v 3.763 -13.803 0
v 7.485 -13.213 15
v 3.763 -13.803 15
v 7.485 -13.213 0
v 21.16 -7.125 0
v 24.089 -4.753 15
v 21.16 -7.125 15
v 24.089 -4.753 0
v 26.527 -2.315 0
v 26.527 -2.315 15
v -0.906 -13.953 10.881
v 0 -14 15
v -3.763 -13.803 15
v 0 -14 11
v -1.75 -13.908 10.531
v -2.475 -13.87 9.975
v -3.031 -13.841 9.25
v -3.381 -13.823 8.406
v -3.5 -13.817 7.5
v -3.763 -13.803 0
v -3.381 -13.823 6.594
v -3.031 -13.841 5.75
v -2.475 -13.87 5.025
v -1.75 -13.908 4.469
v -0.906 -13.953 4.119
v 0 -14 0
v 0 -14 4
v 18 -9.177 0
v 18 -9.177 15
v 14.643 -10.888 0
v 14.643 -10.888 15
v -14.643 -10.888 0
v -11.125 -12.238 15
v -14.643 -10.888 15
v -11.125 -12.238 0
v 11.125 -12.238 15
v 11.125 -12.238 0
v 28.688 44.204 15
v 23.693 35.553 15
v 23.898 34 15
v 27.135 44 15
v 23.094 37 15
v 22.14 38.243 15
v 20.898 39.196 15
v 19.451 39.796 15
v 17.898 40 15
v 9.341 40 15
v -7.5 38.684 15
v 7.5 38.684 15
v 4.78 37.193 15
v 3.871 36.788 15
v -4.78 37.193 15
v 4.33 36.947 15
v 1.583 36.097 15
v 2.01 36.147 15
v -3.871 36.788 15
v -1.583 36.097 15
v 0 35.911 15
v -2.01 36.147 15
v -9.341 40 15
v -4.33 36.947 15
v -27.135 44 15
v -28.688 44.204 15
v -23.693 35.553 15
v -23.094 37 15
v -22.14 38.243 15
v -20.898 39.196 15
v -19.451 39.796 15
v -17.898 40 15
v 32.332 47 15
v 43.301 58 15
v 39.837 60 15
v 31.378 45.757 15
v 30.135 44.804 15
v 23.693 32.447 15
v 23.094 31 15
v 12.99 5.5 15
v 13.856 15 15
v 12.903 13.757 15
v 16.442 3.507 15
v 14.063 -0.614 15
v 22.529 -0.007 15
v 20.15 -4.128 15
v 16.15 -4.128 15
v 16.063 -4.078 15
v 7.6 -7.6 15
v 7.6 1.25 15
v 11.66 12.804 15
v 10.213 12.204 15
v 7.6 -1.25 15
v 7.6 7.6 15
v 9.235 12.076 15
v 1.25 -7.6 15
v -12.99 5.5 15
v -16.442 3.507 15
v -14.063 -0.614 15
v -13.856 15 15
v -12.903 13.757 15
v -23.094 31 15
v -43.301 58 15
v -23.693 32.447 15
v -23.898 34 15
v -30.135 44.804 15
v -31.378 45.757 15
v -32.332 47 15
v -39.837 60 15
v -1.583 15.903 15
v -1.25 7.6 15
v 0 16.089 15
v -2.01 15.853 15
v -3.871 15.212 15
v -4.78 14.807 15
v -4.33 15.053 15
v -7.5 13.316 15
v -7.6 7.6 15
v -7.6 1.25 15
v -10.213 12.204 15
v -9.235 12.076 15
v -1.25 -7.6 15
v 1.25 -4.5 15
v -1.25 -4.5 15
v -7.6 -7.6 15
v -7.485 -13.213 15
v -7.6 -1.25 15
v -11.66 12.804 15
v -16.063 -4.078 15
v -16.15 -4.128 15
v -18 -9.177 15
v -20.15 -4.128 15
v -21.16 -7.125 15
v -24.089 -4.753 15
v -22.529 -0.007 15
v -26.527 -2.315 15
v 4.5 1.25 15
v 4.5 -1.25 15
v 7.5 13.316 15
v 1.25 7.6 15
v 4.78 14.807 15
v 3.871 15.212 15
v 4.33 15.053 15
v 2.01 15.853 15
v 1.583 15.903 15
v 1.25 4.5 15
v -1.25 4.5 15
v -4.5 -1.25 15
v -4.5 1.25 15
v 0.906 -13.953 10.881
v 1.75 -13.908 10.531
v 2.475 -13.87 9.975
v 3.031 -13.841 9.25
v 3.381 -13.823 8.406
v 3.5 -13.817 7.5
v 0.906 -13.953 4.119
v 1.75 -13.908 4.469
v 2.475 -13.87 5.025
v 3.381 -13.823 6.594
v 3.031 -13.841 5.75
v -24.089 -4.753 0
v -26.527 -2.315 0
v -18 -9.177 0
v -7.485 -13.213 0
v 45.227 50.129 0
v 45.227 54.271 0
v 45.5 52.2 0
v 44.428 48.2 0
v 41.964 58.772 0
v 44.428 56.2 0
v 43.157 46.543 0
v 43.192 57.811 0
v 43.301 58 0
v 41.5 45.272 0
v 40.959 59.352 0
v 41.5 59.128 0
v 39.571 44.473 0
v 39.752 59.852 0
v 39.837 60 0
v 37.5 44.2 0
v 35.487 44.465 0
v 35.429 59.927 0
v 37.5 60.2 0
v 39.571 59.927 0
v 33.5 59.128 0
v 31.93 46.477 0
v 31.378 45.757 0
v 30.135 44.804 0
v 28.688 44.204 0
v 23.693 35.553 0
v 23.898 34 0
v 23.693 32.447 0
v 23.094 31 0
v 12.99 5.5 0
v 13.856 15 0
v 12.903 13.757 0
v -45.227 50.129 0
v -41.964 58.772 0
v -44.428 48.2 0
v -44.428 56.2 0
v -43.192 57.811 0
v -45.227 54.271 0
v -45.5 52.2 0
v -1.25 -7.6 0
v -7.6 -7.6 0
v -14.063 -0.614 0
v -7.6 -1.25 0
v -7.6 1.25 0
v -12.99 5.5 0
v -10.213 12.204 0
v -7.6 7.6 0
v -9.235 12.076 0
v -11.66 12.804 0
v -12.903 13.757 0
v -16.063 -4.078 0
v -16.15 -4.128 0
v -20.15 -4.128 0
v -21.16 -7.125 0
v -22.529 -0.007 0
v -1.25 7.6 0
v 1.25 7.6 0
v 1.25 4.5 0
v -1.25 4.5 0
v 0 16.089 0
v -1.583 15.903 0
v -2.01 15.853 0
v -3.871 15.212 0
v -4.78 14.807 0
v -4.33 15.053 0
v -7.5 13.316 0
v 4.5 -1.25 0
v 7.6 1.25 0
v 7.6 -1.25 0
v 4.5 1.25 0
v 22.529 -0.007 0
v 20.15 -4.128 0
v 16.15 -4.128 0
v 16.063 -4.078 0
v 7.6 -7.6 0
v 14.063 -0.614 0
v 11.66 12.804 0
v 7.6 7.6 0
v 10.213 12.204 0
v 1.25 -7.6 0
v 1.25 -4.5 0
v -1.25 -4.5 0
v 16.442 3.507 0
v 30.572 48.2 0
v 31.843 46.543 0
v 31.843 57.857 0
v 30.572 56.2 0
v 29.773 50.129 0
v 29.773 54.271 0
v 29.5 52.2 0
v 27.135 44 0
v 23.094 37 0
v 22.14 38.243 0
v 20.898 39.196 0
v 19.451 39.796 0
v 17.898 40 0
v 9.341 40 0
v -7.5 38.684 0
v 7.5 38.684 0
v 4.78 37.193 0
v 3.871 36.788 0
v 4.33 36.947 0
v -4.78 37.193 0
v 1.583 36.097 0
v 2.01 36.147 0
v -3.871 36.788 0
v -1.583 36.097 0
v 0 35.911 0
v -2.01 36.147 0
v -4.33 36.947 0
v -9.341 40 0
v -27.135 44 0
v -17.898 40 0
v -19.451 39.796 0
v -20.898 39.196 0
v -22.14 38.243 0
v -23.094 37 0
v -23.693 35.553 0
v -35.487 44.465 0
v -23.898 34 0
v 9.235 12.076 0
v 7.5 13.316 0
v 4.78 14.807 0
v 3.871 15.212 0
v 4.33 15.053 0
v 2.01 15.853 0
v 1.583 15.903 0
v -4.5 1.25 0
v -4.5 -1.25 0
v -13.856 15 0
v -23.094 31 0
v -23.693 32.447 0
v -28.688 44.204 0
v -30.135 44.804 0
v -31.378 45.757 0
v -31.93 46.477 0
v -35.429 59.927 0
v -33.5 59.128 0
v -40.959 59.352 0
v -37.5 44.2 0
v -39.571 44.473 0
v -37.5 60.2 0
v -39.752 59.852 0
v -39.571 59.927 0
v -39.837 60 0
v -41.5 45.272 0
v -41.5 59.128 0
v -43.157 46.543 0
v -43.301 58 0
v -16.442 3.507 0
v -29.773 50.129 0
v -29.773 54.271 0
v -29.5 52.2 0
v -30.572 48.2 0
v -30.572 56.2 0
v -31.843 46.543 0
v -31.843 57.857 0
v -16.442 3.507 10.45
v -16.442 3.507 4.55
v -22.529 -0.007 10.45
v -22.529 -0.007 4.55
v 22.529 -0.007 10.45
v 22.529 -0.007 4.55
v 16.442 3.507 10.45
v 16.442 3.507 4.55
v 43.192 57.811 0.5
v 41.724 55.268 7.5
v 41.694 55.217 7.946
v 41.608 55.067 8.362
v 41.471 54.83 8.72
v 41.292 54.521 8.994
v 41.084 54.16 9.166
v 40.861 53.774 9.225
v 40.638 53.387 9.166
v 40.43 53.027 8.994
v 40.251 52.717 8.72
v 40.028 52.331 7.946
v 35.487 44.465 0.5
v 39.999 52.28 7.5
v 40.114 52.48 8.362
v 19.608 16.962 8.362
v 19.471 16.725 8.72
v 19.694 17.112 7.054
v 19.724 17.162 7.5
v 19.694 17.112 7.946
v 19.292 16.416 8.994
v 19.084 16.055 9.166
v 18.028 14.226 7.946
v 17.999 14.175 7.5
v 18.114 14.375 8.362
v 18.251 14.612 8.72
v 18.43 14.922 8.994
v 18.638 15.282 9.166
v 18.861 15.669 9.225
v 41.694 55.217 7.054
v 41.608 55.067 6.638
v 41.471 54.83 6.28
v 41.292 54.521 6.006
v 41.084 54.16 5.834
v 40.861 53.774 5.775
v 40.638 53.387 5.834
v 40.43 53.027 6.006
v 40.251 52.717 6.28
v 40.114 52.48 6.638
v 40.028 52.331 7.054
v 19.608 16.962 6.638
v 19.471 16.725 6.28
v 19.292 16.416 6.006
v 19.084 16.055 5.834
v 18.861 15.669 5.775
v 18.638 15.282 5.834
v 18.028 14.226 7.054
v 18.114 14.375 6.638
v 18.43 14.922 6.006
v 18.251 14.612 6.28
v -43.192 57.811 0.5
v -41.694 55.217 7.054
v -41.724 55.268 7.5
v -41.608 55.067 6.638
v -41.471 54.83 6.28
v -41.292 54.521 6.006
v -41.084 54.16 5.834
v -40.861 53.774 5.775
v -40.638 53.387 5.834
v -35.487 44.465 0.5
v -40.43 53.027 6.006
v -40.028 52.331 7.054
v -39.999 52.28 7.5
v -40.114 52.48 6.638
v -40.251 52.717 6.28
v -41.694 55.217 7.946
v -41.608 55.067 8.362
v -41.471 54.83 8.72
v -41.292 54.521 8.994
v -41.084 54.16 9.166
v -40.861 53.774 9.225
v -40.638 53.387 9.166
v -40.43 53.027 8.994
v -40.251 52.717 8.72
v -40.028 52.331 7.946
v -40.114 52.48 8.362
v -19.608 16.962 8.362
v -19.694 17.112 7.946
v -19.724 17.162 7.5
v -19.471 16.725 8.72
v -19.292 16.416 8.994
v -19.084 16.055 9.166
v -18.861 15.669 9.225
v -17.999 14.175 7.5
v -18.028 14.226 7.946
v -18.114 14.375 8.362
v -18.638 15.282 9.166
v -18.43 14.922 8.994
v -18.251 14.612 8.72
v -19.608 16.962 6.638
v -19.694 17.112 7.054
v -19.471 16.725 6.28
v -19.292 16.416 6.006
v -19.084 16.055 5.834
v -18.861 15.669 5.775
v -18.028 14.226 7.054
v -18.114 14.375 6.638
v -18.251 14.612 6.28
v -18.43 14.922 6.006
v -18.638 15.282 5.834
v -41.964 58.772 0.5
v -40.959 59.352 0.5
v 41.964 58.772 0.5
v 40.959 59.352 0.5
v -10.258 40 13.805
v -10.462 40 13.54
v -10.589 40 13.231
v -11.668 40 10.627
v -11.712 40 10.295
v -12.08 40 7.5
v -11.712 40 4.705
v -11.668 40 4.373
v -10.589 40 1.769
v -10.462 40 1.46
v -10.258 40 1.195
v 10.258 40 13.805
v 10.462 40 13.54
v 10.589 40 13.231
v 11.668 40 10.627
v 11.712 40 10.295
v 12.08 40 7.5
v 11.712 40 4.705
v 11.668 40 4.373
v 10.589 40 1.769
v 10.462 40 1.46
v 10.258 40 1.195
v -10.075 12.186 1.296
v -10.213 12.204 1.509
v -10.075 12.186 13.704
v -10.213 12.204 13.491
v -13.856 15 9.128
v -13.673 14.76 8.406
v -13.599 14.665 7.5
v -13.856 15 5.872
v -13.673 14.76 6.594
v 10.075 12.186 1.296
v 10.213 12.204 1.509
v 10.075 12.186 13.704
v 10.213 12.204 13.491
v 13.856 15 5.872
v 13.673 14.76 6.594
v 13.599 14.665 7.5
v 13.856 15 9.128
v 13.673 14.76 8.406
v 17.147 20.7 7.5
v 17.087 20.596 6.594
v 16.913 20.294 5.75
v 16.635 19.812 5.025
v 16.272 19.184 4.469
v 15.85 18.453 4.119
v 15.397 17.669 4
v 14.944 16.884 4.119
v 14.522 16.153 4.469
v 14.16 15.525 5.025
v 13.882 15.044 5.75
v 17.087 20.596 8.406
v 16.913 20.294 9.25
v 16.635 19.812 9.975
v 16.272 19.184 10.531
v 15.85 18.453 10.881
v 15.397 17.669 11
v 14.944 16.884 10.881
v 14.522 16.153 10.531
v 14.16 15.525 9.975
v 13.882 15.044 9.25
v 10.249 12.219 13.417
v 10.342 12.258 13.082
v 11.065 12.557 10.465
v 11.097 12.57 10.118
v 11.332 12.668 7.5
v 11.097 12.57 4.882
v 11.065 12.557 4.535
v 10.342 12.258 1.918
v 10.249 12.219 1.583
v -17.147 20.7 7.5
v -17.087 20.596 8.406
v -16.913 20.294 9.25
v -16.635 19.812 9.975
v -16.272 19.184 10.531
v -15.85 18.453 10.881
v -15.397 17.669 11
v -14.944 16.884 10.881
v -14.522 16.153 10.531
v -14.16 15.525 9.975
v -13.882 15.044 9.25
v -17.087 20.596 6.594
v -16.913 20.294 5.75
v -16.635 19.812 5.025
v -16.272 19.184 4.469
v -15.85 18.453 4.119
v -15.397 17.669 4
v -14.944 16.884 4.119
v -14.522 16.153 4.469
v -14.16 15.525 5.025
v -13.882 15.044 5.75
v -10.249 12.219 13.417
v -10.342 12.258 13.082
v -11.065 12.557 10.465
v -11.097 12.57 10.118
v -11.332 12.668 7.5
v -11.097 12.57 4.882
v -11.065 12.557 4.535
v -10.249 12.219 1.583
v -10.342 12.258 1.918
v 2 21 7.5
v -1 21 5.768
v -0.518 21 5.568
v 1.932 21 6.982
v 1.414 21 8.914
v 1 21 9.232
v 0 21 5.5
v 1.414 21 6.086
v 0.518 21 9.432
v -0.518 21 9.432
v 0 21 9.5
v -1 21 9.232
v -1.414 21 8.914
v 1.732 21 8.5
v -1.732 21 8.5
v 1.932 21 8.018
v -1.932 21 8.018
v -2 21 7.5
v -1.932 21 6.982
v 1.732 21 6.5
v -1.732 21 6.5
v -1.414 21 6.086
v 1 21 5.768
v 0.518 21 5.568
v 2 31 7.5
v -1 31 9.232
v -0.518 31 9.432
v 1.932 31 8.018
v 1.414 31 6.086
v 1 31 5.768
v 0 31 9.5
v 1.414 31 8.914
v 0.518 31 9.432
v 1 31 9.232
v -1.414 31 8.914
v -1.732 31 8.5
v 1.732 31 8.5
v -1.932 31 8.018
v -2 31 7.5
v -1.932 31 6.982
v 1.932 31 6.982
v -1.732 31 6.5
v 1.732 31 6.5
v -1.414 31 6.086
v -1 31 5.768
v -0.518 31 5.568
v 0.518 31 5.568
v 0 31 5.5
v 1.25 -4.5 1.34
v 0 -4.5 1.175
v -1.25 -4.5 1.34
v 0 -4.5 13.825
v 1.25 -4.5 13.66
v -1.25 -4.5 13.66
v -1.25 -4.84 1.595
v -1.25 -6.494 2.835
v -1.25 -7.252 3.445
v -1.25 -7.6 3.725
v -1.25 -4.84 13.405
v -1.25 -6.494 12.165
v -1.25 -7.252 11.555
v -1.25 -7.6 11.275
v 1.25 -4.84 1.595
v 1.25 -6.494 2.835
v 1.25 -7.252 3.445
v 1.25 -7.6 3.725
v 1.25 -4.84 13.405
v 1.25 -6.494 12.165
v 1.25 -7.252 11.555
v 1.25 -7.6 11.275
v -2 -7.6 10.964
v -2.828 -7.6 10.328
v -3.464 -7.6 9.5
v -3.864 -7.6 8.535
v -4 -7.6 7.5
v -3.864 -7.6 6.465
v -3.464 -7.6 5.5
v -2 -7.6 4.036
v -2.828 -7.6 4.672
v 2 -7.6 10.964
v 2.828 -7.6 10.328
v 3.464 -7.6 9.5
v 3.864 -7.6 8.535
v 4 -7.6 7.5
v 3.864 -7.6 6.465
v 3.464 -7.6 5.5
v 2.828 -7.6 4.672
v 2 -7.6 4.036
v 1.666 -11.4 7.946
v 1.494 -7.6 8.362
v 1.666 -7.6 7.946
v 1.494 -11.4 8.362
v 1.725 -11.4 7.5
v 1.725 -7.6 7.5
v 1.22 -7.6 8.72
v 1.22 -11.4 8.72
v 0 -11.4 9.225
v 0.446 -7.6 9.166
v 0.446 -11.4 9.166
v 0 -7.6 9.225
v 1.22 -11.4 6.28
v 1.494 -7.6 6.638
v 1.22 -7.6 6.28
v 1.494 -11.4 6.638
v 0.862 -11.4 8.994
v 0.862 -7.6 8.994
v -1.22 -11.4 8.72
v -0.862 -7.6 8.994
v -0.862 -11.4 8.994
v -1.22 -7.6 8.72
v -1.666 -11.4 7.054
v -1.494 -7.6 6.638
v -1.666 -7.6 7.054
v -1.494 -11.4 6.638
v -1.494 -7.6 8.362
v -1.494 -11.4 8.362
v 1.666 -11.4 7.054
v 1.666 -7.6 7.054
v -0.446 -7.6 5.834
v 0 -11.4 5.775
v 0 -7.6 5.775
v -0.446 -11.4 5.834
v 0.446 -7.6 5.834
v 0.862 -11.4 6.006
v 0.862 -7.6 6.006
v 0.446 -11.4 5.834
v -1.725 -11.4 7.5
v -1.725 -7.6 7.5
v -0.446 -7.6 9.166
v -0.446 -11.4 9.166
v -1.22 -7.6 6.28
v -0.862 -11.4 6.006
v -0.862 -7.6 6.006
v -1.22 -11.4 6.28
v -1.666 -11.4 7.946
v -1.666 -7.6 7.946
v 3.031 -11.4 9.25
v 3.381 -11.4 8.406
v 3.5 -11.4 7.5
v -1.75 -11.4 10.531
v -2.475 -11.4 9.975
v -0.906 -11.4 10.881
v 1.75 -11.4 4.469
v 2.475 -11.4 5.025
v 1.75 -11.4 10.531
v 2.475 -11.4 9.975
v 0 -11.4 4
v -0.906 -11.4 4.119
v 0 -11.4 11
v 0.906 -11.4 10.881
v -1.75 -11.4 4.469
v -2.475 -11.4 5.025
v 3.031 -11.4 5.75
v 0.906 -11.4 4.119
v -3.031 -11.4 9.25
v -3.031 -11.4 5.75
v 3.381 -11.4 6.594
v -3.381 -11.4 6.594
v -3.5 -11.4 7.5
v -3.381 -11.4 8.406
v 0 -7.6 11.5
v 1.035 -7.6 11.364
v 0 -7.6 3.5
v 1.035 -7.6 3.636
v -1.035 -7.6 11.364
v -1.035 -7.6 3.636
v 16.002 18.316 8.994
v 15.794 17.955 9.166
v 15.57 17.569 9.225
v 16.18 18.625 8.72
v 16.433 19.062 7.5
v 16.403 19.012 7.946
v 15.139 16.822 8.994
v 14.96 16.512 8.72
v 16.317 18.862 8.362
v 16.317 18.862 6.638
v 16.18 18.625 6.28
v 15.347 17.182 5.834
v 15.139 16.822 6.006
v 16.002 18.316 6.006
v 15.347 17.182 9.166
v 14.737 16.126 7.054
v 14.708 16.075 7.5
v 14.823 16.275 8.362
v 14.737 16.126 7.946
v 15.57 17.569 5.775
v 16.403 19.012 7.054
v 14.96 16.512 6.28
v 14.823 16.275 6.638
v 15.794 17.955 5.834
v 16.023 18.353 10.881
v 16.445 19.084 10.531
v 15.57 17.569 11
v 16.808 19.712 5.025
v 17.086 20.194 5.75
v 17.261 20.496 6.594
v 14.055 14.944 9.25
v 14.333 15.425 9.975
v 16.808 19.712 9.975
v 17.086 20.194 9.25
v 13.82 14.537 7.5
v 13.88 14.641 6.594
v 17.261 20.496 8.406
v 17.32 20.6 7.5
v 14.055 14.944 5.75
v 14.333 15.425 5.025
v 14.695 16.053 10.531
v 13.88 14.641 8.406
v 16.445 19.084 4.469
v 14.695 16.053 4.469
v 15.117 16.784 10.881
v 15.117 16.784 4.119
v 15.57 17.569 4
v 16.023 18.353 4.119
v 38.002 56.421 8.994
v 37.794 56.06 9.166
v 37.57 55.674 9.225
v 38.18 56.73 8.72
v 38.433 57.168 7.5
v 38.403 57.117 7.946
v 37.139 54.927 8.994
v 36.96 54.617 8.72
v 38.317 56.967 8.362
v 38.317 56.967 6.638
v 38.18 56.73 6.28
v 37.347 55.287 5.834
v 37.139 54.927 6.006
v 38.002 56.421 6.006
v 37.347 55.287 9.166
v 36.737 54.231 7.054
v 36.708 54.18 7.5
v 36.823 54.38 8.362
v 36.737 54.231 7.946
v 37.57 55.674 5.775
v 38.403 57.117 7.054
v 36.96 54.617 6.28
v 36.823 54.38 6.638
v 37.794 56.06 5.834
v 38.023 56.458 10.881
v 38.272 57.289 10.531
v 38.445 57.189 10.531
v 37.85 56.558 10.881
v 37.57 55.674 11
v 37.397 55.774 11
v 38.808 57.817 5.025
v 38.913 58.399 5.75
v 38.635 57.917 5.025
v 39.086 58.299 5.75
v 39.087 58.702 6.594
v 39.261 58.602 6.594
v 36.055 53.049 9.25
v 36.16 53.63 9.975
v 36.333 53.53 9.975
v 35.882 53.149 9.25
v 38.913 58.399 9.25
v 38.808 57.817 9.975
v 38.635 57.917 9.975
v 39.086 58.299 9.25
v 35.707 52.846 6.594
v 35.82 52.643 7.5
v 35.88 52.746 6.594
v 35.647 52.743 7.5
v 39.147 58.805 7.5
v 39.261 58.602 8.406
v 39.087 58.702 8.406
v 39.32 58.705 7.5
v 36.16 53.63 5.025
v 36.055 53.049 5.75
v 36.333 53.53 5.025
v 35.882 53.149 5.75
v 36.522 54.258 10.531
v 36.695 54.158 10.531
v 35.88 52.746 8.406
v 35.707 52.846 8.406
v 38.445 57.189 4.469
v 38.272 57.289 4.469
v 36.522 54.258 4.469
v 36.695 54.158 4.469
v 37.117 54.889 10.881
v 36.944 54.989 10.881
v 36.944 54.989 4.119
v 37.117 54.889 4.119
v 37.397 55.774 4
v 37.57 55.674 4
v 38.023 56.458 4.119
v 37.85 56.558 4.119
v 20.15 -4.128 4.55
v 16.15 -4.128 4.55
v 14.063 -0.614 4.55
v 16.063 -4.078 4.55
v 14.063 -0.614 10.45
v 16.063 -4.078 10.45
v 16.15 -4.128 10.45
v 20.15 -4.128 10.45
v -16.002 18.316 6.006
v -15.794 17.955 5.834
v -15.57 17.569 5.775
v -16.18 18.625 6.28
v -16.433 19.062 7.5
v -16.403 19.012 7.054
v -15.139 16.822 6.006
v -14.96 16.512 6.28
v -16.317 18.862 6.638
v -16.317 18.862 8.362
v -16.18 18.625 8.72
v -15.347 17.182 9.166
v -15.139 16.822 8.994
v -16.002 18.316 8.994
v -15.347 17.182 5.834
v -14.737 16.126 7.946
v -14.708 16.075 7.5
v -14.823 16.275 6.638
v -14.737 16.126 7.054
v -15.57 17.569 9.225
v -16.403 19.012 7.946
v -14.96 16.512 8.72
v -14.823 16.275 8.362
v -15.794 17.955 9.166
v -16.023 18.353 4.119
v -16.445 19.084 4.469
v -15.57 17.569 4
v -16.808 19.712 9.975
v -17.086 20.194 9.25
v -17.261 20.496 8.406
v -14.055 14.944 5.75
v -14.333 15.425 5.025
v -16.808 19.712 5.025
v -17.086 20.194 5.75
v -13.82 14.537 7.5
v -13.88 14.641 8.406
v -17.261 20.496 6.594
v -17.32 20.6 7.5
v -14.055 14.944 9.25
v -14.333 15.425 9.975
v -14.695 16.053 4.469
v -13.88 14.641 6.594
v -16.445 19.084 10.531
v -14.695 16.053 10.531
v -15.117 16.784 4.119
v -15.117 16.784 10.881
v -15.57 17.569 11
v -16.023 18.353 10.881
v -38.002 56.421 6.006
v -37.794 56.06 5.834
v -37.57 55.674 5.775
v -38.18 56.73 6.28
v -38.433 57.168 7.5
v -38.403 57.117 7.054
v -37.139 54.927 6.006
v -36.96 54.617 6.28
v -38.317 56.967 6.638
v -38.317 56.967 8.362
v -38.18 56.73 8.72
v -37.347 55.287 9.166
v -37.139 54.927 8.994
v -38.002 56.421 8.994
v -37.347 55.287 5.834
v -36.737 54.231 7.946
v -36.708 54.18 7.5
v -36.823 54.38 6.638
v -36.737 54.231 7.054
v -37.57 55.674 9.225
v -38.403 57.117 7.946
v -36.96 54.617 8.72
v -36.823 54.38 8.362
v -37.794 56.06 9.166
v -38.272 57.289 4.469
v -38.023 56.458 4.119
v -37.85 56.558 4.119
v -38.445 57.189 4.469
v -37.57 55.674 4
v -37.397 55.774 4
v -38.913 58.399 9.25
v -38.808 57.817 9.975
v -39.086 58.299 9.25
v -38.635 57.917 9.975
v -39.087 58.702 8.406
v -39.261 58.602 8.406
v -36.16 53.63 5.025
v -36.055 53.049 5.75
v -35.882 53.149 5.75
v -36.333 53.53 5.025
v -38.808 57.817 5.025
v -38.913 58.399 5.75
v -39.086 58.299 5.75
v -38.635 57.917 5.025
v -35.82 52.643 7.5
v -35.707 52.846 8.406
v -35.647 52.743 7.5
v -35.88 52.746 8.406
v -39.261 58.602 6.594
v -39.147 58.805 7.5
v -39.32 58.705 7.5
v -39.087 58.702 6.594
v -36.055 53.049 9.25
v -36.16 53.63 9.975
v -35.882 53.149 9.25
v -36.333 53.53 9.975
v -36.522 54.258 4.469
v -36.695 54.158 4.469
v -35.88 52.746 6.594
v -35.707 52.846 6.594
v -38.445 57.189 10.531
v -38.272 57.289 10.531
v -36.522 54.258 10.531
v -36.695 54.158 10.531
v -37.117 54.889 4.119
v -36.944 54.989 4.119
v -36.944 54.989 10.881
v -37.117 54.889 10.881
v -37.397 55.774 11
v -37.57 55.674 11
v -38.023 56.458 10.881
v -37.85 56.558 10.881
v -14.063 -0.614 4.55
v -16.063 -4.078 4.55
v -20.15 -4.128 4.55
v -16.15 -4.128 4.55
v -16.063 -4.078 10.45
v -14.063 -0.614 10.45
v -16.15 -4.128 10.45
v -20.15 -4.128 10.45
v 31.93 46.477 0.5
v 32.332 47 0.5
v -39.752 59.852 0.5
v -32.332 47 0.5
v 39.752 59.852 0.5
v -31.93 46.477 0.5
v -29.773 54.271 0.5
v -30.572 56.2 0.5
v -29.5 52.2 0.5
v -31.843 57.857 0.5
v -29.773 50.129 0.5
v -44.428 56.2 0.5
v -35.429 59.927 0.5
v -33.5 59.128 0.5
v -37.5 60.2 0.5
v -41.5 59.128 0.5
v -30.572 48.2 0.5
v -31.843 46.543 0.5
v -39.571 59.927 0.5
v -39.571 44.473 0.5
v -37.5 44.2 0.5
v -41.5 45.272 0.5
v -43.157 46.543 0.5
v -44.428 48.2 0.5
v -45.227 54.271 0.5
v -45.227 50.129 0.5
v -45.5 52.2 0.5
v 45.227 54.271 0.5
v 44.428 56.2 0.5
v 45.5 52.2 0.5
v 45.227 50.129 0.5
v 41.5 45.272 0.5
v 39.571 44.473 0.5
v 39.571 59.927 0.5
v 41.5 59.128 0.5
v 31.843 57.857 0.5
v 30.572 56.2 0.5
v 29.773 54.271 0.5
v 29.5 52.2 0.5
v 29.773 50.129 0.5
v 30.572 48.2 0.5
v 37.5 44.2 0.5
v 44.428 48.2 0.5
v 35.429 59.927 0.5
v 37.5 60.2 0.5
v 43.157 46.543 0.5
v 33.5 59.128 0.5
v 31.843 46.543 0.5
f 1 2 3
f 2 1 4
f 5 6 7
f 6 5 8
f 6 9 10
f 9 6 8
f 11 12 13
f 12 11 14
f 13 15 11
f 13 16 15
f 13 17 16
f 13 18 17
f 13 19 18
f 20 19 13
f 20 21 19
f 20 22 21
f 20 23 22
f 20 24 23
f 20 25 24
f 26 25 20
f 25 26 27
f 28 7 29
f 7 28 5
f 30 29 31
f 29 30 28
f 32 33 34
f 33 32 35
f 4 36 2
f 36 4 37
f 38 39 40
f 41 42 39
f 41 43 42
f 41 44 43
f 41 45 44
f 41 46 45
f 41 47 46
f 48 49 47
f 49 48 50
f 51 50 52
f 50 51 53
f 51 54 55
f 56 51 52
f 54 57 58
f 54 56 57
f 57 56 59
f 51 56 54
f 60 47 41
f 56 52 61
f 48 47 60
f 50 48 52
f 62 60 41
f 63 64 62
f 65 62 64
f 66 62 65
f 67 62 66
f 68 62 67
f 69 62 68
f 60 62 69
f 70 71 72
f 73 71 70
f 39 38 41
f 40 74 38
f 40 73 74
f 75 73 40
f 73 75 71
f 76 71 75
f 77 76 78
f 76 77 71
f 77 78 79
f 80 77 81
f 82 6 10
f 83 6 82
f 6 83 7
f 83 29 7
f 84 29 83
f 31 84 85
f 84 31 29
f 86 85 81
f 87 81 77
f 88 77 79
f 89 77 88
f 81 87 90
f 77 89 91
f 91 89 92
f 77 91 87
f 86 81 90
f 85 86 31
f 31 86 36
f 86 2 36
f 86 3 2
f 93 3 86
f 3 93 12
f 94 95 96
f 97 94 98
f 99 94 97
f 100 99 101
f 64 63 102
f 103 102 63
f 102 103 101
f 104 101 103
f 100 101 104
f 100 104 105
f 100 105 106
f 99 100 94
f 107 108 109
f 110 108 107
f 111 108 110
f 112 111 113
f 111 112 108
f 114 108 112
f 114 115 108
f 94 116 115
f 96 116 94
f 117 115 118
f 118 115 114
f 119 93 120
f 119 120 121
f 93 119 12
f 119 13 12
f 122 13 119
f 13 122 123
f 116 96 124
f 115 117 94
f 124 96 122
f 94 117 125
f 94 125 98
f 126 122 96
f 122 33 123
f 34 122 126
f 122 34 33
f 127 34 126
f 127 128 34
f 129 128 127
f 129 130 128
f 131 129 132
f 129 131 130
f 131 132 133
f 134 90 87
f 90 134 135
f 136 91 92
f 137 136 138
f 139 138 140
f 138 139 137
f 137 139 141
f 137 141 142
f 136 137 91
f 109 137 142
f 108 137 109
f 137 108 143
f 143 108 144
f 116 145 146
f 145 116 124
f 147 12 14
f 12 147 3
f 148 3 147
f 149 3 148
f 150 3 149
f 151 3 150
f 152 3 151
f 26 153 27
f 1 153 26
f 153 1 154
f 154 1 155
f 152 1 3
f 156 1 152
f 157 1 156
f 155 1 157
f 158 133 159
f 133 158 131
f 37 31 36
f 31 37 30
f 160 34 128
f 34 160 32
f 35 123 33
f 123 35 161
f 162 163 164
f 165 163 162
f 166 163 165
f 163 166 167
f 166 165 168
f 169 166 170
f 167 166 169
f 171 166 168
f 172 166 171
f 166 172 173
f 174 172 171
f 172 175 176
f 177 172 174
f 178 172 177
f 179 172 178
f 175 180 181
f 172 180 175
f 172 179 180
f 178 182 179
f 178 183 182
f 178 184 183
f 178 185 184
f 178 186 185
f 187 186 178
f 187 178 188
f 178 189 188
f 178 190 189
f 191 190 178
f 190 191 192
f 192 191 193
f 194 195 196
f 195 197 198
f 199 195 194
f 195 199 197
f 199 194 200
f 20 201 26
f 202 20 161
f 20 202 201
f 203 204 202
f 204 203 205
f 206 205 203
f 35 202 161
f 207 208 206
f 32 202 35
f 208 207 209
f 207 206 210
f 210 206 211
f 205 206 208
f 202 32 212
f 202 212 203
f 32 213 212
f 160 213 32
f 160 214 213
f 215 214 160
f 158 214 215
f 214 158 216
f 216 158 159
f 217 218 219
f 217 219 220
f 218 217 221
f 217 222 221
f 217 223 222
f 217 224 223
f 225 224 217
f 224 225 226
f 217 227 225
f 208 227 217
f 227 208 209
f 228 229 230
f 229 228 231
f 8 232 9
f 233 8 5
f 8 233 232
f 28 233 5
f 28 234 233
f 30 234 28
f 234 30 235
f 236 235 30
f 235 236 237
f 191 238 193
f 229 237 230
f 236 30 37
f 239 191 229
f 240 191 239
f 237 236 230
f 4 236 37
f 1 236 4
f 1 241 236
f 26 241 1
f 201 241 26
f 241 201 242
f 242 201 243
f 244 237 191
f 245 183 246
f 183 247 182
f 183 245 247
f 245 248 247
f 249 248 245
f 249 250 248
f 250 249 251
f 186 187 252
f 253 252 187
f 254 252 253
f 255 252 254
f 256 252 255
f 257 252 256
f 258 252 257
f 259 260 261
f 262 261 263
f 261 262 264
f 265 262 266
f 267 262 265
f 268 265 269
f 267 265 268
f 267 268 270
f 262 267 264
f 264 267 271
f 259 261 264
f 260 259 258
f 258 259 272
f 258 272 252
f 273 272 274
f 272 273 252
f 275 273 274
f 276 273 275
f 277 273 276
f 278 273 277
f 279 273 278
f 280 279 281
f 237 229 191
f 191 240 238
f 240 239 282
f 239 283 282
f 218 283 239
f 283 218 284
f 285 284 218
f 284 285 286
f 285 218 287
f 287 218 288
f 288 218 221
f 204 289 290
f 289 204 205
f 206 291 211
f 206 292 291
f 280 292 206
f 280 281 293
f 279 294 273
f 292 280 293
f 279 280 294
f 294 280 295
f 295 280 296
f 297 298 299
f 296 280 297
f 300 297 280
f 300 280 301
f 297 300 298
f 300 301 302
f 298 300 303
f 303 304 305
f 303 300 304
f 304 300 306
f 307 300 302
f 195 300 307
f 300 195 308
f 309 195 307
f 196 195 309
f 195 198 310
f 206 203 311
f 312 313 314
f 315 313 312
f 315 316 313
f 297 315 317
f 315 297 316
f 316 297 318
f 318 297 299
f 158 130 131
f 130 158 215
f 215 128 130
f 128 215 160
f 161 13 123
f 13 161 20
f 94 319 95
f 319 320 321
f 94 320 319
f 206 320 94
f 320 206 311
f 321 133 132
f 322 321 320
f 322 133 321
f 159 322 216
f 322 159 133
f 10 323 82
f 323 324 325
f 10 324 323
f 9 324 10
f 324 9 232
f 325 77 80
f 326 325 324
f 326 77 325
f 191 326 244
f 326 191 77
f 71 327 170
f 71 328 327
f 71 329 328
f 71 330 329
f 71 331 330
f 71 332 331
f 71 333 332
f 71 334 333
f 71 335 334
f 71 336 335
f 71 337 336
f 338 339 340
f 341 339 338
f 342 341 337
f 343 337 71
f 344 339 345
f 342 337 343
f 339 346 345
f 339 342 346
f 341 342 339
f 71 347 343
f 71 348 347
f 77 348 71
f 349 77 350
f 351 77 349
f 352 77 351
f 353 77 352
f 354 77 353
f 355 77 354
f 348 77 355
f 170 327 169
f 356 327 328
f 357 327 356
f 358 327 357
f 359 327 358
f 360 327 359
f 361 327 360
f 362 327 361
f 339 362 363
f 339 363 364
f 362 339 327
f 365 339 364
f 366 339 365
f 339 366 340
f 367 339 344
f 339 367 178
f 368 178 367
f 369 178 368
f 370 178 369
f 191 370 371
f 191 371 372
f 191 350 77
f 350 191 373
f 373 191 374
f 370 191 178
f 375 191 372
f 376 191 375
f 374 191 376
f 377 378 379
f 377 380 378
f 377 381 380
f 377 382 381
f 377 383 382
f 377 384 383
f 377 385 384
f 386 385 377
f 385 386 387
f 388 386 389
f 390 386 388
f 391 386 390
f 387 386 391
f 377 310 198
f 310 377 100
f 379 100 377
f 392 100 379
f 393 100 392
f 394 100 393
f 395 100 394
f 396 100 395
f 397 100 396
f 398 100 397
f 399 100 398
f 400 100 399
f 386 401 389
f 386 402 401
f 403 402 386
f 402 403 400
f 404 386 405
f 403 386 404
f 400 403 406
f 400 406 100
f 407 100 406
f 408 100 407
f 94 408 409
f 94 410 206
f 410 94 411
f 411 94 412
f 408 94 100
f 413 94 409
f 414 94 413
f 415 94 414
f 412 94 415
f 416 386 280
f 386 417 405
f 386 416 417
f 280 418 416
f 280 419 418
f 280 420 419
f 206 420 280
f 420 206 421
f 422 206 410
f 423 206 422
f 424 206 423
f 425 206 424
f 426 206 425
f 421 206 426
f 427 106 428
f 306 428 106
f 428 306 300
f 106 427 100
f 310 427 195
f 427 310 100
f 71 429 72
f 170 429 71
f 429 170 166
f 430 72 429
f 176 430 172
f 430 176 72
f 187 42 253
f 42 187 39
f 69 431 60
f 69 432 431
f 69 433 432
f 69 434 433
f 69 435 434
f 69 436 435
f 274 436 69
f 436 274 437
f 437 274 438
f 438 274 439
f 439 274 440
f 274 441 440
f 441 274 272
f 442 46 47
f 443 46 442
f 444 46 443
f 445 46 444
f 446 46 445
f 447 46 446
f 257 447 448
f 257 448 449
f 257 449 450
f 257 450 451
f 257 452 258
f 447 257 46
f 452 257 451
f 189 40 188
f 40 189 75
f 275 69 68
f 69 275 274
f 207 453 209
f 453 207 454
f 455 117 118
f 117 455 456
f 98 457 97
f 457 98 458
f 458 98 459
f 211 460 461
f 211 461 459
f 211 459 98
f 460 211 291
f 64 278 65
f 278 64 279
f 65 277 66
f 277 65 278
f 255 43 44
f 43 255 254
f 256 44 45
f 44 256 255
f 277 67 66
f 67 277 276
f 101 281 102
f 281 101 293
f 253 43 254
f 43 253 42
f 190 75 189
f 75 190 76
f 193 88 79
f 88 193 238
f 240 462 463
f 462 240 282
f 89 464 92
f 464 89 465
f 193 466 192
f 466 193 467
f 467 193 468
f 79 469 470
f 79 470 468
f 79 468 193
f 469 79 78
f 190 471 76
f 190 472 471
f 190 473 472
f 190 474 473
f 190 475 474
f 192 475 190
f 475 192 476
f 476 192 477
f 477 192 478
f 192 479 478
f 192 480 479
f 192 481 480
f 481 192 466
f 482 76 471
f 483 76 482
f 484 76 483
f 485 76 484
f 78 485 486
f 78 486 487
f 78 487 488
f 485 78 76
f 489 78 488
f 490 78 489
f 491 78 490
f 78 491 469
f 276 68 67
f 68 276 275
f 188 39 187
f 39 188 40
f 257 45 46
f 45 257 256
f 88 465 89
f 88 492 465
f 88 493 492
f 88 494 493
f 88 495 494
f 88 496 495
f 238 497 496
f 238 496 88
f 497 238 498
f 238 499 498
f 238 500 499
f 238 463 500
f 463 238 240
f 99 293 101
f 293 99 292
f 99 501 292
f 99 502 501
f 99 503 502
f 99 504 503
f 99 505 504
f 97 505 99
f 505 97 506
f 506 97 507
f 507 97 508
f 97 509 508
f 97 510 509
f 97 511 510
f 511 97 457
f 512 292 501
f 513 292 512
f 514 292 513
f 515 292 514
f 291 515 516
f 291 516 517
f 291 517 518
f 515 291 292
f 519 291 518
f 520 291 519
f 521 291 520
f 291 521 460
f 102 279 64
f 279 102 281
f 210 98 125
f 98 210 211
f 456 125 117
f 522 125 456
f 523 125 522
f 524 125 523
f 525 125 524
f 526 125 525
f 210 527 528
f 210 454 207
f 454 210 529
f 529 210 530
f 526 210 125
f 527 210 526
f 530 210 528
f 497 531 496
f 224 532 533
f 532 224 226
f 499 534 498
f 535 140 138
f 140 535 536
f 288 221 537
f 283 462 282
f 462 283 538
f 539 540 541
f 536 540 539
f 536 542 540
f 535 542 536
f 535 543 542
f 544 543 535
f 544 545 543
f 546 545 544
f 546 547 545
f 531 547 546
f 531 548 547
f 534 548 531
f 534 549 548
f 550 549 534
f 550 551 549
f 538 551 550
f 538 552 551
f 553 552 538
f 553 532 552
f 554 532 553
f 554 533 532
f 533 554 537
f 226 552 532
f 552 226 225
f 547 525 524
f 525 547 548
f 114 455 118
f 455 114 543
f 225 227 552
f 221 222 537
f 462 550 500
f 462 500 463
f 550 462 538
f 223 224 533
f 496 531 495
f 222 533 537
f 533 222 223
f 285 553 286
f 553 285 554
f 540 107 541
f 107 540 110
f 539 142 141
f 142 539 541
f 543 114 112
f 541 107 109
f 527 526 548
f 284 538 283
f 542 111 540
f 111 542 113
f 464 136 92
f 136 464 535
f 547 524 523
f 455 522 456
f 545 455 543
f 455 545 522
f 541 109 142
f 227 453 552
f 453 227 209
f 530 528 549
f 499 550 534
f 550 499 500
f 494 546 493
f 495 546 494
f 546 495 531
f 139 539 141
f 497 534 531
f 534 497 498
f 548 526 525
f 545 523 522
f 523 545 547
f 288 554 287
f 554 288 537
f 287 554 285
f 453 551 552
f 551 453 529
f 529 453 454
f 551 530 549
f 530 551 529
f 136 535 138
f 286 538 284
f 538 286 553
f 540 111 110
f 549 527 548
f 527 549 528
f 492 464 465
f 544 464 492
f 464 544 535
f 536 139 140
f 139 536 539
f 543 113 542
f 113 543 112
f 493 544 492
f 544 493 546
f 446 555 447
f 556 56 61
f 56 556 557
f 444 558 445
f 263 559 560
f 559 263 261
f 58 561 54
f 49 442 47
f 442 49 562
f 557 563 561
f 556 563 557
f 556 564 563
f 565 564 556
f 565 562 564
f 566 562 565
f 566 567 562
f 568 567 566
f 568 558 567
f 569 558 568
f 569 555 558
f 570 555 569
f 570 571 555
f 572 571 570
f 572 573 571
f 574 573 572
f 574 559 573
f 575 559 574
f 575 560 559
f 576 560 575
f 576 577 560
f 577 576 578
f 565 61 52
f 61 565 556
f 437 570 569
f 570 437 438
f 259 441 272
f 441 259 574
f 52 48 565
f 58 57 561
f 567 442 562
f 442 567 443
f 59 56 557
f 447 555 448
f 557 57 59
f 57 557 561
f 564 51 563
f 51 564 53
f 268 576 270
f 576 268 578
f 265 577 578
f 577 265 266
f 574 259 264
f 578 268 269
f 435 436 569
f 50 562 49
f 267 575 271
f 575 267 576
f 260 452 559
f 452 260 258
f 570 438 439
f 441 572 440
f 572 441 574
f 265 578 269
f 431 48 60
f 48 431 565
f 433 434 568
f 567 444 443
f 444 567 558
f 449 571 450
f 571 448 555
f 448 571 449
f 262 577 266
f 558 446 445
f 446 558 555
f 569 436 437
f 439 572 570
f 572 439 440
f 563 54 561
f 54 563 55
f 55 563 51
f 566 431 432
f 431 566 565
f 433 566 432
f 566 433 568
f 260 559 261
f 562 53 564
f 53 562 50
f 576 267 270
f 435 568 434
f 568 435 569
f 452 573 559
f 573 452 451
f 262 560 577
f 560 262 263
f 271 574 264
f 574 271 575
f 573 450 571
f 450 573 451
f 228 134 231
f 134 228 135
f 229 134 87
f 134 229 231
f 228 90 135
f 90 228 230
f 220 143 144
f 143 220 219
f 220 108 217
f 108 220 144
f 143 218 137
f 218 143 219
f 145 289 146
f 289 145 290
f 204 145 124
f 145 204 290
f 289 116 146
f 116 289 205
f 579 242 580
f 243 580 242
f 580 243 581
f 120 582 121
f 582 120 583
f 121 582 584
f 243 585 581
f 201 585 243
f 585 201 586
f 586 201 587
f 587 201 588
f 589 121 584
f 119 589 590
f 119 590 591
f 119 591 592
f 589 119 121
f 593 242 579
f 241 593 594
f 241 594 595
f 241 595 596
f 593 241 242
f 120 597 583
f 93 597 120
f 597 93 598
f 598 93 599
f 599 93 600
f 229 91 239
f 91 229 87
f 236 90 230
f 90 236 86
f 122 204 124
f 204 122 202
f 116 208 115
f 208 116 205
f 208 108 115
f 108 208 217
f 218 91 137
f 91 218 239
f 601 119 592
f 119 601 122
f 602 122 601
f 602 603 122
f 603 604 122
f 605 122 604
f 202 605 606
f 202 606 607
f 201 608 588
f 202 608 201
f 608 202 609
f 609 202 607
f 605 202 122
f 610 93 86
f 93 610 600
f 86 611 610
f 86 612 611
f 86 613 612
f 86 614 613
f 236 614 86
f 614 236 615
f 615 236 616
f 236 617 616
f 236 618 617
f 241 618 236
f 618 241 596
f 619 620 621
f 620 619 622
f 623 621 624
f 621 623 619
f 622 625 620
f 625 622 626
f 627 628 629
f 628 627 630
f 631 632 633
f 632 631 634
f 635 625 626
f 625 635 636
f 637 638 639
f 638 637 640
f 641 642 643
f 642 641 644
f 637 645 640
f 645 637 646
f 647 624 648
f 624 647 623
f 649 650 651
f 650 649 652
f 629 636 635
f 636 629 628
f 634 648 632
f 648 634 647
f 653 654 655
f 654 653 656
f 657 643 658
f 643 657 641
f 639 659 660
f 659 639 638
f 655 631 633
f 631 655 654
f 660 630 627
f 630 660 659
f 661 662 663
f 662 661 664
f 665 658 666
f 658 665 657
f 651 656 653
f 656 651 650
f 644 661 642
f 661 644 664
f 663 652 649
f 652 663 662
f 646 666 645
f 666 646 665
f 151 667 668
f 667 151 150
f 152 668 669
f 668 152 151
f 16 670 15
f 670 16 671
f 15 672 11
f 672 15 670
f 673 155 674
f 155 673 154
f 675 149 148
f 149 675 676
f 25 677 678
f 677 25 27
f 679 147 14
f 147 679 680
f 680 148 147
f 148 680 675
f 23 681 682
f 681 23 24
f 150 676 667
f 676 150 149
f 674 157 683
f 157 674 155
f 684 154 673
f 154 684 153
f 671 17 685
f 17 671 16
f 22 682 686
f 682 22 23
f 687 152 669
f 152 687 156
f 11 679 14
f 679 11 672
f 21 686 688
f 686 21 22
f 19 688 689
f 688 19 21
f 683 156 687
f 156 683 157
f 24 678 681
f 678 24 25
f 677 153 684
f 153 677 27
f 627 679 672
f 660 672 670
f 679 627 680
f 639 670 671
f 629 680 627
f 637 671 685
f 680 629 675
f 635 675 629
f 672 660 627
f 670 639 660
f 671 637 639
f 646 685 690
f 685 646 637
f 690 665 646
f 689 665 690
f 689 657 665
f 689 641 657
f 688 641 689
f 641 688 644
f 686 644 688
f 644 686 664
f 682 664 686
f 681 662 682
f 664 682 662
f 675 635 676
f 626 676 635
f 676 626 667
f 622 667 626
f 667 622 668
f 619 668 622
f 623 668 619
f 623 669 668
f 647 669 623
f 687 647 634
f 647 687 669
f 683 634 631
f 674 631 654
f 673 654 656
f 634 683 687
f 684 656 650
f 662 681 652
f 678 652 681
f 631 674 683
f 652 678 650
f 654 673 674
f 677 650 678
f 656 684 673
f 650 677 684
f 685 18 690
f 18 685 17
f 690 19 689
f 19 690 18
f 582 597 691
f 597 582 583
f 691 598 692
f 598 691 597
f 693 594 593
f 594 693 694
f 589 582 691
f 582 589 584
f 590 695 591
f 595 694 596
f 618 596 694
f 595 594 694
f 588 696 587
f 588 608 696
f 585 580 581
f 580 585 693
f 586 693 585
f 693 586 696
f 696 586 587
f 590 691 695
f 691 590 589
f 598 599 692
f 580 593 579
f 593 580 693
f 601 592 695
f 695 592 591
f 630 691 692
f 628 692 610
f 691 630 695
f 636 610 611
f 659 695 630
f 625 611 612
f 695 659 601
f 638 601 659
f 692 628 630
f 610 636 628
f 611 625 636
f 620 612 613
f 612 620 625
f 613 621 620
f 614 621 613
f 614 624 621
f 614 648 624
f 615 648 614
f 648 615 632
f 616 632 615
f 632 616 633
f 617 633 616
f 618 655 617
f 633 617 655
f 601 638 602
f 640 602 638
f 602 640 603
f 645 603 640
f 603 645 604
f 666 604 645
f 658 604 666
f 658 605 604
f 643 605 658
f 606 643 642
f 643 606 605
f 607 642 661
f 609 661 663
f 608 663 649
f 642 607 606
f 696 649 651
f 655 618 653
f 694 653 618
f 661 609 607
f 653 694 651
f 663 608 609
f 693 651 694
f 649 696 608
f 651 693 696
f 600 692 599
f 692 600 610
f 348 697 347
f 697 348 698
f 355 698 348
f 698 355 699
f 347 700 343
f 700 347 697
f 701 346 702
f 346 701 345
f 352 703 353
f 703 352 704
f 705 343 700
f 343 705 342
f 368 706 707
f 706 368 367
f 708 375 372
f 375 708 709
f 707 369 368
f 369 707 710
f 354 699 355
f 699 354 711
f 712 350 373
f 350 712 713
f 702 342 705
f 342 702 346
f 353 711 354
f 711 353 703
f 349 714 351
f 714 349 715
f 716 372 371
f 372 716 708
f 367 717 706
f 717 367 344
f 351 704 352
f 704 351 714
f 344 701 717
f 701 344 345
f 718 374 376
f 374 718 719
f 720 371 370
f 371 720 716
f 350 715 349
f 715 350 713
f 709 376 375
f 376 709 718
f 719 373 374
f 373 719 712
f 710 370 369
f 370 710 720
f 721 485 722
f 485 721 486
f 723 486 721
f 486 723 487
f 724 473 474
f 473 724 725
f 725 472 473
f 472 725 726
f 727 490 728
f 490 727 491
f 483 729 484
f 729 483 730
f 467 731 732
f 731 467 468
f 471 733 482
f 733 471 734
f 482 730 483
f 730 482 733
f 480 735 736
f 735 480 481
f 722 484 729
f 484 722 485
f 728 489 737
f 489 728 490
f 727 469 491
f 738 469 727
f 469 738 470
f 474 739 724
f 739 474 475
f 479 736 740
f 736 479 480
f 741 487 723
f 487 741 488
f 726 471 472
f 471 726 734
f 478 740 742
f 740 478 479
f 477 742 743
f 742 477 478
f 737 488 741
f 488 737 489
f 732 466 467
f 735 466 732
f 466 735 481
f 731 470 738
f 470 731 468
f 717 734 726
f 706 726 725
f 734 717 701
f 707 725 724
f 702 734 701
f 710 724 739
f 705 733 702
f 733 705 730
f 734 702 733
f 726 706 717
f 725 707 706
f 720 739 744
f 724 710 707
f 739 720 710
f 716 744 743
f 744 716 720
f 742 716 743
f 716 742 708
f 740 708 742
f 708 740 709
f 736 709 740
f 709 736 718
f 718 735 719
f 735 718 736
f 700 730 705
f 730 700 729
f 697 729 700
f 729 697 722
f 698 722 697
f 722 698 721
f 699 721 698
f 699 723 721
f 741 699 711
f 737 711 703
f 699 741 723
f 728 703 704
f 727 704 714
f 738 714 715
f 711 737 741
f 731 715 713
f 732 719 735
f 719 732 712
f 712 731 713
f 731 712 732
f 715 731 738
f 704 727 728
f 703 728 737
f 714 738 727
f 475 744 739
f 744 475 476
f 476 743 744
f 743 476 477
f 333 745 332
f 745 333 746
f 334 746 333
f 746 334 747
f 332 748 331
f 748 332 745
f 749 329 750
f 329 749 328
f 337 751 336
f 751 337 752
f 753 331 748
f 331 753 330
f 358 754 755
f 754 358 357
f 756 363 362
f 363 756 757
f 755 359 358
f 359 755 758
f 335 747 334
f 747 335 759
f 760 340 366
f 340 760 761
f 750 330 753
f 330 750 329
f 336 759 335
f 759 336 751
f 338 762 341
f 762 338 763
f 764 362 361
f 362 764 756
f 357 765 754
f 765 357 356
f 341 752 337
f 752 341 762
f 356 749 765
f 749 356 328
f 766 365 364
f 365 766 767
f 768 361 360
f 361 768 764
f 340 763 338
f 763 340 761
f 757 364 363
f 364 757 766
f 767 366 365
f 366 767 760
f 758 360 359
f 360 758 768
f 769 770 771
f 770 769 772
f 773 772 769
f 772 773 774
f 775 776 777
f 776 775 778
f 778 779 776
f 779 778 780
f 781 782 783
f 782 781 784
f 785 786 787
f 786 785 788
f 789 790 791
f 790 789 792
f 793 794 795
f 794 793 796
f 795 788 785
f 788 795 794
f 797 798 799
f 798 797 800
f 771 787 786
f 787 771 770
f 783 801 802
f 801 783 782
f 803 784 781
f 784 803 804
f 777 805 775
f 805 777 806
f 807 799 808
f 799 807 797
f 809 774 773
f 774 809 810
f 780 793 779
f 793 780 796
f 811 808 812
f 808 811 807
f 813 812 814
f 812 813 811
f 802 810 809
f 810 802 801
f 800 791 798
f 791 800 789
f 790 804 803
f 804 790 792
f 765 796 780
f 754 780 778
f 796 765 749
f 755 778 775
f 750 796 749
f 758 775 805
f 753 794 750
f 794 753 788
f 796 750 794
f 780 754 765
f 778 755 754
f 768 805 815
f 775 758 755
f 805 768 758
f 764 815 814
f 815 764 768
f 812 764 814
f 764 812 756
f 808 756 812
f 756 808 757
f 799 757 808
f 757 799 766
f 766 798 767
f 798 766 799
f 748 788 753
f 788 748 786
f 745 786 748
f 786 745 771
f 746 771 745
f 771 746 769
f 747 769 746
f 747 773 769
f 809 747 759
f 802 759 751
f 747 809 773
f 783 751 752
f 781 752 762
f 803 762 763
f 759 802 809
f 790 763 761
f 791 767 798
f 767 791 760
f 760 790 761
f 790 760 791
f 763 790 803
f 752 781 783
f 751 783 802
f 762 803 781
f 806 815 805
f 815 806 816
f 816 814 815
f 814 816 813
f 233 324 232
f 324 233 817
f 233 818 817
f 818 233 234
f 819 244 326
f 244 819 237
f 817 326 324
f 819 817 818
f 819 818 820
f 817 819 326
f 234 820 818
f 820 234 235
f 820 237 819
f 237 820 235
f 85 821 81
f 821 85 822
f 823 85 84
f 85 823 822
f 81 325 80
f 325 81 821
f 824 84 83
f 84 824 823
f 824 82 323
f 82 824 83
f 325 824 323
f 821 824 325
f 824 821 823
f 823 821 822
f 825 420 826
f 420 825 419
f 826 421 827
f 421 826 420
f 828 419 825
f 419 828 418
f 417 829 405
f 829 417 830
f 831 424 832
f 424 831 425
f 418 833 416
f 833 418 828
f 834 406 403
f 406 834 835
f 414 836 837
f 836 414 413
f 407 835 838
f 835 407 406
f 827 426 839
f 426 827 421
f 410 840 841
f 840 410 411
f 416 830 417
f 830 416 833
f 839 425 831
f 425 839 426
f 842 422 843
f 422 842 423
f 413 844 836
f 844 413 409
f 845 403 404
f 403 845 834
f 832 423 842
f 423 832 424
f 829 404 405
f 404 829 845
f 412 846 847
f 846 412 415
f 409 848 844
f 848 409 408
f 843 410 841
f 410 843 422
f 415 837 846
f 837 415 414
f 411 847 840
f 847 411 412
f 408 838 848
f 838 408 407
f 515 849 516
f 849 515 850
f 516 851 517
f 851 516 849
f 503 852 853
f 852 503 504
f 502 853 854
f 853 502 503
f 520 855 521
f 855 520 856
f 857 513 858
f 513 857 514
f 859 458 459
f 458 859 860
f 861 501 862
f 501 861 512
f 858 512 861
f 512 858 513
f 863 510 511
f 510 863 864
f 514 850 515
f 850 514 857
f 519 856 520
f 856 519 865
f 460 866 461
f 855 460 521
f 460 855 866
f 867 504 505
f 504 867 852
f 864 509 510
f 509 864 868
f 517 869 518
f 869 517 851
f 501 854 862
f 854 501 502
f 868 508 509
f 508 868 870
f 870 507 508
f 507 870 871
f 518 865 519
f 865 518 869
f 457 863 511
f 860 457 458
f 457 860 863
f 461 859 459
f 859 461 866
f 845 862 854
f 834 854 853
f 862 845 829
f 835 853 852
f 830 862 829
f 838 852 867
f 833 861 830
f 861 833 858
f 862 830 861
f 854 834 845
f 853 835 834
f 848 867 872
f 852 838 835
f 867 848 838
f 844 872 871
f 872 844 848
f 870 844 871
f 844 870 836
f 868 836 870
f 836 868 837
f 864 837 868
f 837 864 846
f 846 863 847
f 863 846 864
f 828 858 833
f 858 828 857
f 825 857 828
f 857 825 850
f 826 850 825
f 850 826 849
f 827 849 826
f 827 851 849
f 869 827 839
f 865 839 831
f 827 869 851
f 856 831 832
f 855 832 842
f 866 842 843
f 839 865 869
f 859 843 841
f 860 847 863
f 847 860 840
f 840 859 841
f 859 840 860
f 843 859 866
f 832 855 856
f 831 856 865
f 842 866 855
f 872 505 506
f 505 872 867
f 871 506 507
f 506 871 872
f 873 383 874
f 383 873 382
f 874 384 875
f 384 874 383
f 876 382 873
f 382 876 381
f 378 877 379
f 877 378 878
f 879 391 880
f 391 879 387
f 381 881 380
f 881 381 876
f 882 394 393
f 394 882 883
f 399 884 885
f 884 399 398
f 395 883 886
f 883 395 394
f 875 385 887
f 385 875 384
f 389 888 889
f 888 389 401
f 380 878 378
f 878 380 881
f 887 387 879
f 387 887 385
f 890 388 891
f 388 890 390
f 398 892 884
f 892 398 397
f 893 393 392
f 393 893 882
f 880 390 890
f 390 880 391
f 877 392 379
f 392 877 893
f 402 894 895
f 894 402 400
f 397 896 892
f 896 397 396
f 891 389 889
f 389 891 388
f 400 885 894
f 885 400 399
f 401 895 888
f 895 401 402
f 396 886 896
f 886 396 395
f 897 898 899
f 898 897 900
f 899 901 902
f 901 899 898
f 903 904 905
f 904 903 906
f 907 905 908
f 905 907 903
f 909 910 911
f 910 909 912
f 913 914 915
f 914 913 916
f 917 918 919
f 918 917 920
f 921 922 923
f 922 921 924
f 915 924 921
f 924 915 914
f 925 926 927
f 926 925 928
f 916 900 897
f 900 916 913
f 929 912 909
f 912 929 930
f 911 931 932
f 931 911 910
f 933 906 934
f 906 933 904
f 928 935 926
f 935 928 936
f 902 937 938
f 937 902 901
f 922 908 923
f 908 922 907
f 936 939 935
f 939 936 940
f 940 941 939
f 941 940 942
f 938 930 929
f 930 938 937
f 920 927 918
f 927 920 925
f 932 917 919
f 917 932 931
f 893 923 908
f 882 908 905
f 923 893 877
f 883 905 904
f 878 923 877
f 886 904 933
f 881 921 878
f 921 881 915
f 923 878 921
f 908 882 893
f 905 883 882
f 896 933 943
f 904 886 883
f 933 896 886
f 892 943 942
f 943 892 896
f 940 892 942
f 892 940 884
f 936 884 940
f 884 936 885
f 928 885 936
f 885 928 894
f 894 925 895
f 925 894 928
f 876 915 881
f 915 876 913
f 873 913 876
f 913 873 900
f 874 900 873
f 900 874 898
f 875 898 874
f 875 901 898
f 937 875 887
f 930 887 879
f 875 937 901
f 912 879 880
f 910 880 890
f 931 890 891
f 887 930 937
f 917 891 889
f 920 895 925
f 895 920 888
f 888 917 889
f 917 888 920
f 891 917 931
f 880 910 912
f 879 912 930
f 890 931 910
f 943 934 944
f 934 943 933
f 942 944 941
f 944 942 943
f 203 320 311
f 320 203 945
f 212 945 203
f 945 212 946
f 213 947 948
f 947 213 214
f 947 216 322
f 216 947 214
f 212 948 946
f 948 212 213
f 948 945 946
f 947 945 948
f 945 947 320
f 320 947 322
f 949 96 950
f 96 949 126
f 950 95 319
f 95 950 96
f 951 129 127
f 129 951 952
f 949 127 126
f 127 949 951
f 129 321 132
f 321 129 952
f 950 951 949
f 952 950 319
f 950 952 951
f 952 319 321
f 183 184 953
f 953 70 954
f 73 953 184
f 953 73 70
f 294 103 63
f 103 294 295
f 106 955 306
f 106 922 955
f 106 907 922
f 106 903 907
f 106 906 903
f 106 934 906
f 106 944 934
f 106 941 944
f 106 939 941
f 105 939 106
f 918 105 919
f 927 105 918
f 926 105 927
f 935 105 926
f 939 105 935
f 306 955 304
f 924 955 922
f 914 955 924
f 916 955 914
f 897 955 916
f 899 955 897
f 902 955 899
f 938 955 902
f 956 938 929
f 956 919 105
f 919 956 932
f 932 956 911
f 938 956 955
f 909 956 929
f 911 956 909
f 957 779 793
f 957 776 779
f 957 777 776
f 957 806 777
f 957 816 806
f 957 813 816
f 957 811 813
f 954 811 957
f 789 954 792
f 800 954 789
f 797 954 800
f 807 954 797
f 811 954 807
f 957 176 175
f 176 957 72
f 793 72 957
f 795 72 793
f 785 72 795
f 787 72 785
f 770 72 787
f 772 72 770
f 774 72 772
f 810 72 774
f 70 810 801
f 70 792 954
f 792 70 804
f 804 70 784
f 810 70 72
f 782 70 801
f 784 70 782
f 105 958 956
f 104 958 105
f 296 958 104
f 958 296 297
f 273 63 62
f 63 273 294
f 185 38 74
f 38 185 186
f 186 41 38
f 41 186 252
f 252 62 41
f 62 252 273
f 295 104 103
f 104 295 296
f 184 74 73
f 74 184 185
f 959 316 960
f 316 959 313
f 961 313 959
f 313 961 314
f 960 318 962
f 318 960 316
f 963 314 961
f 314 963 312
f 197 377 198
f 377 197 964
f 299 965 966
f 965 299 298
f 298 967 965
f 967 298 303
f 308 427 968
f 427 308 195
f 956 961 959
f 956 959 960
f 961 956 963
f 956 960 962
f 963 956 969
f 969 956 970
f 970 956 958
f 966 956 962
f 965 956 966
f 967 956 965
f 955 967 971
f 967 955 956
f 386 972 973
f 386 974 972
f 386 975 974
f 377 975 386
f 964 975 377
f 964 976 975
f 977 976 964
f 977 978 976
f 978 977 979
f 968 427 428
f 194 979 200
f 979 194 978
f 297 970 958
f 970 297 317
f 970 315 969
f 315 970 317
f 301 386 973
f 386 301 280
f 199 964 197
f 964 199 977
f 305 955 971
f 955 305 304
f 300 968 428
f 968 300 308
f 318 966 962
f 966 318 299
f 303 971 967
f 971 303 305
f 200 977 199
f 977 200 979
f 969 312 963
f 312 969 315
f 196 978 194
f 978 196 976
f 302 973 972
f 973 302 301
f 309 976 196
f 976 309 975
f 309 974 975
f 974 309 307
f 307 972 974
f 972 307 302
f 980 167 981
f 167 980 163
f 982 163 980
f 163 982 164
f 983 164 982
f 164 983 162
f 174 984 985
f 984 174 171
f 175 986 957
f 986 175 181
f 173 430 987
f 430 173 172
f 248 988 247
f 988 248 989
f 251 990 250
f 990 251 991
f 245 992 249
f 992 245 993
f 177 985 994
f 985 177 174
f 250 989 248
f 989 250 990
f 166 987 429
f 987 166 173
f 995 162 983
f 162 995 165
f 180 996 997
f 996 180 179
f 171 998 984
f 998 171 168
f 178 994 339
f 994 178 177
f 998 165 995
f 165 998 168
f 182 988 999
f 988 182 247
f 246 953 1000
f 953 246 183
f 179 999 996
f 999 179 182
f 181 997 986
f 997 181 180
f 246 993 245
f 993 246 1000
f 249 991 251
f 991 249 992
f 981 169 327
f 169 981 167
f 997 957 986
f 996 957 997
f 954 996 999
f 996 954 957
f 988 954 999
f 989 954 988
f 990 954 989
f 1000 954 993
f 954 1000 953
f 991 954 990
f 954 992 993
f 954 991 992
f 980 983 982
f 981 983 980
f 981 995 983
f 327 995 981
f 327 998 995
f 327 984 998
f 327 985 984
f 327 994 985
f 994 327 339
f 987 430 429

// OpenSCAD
// file: ../include/configuration.scad
// Increase this if your slicer or printer make holes too tight.
extra_radius = 0.1;

// OD = outside diameter, corner to corner.
m3_nut_od = 6.1;
m3_nut_radius = m3_nut_od/2 + 0.2 + extra_radius;
m3_washer_radius = 3.5 + extra_radius;

// Major diameter of metric 3mm thread.
m3_major = 2.85;
m3_radius = m3_major/2 + extra_radius;
m3_wide_radius = m3_major/2 + extra_radius + 0.2;

// NEMA17 stepper motors.
motor_shaft_diameter = 5;
motor_shaft_radius = motor_shaft_diameter/2 + extra_radius;

// Frame brackets. M3x8mm screws work best with 3.6 mm brackets.
thickness = 3.6;

// OpenBeam or Misumi. Currently only 15x15 mm, but there is a plan
// to make models more parametric and allow 20x20 mm in the future.
extrusion = 15;

// Placement for the NEMA17 stepper motors.
motor_offset = 44;
motor_length = 47;
// main file
include <../include/configuration.scad>;

$fn = 24;
roundness = 6;

module extrusion_cutout(h, extra) {
  difference() {
    cube([extrusion+extra, extrusion+extra, h], center=true);
    for (a = [0:90:359]) rotate([0, 0, a]) {
      translate([extrusion/2, 0, 0])
        cube([6, 2.5, h+1], center=true);
    }
  }
}

module screw_socket() {
  cylinder(r=m3_wide_radius, h=20, center=true);
  translate([0, 0, 3.8]) cylinder(r=3.5, h=5);
}

module screw_socket_cone() {
  union() {
    screw_socket();
    scale([1, 1, -1]) cylinder(r1=4, r2=7, h=4);
  }
}

module vertex(height, idler_offset, idler_space) {
  union() {
    // Pads to improve print bed adhesion for slim ends.
    translate([-37.5, 52.2, -height/2]) cylinder(r=8, h=0.5);
    translate([37.5, 52.2, -height/2]) cylinder(r=8, h=0.5);
    difference() {
      union() {
        intersection() {
          translate([0, 22, 0])
            cylinder(r=36, h=height, center=true, $fn=60);
          translate([0, -37, 0]) rotate([0, 0, 30])
            cylinder(r=50, h=height+1, center=true, $fn=6);
        }
        translate([0, 38, 0]) intersection() {
          rotate([0, 0, -90])
            cylinder(r=55, h=height, center=true, $fn=3);
          translate([0, 10, 0])
            cube([100, 100, 2*height], center=true);
          translate([0, -10, 0]) rotate([0, 0, 30])
            cylinder(r=55, h=height+1, center=true, $fn=6);
        }
      }
      difference() {
        translate([0, 58, 0]) minkowski() {
          intersection() {
            rotate([0, 0, -90])
              cylinder(r=55, h=height, center=true, $fn=3);
            translate([0, -32, 0])
              cube([100, 16, 2*height], center=true);
          }
          cylinder(r=roundness, h=1, center=true);
        }
        // Idler support cones.
        translate([0, 26+idler_offset-30, 0]) rotate([-90, 0, 0])
          cylinder(r1=30, r2=2, h=30-idler_space/2);
        translate([0, 26+idler_offset+30, 0]) rotate([90, 0, 0])
          cylinder(r1=30, r2=2, h=30-idler_space/2);
      }
      translate([0, 58, 0]) minkowski() {
        intersection() {
          rotate([0, 0, -90])
            cylinder(r=55, h=height, center=true, $fn=3);
          translate([0, 7, 0])
            cube([100, 30, 2*height], center=true);
        }
        cylinder(r=roundness, h=1, center=true);
      }
      extrusion_cutout(height+10, 2*extra_radius);
      for (z = [0:30:height]) {
        translate([0, -7.5-extra_radius, z+7.5-height/2]) rotate([90, 0, 0])
          screw_socket_cone();
        for (a = [-1, 1]) {
          rotate([0, 0, 30*a]) translate([-16*a, 111, z+7.5-height/2]) {
            // % rotate([90, 0, 0]) extrusion_cutout(200, 0);
            // Screw sockets.
            for (y = [-88, -44]) {
              translate([a*7.5, y, 0]) rotate([0, a*90, 0]) screw_socket();
            }
            // Nut tunnels.
	    for (z = [-1, 1]) {
	      scale([1, 1, z]) translate([0, -100, 3]) minkowski() {
	        rotate([0, 0, -a*30]) cylinder(r=4, h=16, $fn=6);
		cube([0.1, 5, 0.1], center=true);
	      }
            }
          }
        }
      }
    }
  }
}

translate([0, 0, 7.5]) vertex(15, idler_offset=0, idler_space=10);
